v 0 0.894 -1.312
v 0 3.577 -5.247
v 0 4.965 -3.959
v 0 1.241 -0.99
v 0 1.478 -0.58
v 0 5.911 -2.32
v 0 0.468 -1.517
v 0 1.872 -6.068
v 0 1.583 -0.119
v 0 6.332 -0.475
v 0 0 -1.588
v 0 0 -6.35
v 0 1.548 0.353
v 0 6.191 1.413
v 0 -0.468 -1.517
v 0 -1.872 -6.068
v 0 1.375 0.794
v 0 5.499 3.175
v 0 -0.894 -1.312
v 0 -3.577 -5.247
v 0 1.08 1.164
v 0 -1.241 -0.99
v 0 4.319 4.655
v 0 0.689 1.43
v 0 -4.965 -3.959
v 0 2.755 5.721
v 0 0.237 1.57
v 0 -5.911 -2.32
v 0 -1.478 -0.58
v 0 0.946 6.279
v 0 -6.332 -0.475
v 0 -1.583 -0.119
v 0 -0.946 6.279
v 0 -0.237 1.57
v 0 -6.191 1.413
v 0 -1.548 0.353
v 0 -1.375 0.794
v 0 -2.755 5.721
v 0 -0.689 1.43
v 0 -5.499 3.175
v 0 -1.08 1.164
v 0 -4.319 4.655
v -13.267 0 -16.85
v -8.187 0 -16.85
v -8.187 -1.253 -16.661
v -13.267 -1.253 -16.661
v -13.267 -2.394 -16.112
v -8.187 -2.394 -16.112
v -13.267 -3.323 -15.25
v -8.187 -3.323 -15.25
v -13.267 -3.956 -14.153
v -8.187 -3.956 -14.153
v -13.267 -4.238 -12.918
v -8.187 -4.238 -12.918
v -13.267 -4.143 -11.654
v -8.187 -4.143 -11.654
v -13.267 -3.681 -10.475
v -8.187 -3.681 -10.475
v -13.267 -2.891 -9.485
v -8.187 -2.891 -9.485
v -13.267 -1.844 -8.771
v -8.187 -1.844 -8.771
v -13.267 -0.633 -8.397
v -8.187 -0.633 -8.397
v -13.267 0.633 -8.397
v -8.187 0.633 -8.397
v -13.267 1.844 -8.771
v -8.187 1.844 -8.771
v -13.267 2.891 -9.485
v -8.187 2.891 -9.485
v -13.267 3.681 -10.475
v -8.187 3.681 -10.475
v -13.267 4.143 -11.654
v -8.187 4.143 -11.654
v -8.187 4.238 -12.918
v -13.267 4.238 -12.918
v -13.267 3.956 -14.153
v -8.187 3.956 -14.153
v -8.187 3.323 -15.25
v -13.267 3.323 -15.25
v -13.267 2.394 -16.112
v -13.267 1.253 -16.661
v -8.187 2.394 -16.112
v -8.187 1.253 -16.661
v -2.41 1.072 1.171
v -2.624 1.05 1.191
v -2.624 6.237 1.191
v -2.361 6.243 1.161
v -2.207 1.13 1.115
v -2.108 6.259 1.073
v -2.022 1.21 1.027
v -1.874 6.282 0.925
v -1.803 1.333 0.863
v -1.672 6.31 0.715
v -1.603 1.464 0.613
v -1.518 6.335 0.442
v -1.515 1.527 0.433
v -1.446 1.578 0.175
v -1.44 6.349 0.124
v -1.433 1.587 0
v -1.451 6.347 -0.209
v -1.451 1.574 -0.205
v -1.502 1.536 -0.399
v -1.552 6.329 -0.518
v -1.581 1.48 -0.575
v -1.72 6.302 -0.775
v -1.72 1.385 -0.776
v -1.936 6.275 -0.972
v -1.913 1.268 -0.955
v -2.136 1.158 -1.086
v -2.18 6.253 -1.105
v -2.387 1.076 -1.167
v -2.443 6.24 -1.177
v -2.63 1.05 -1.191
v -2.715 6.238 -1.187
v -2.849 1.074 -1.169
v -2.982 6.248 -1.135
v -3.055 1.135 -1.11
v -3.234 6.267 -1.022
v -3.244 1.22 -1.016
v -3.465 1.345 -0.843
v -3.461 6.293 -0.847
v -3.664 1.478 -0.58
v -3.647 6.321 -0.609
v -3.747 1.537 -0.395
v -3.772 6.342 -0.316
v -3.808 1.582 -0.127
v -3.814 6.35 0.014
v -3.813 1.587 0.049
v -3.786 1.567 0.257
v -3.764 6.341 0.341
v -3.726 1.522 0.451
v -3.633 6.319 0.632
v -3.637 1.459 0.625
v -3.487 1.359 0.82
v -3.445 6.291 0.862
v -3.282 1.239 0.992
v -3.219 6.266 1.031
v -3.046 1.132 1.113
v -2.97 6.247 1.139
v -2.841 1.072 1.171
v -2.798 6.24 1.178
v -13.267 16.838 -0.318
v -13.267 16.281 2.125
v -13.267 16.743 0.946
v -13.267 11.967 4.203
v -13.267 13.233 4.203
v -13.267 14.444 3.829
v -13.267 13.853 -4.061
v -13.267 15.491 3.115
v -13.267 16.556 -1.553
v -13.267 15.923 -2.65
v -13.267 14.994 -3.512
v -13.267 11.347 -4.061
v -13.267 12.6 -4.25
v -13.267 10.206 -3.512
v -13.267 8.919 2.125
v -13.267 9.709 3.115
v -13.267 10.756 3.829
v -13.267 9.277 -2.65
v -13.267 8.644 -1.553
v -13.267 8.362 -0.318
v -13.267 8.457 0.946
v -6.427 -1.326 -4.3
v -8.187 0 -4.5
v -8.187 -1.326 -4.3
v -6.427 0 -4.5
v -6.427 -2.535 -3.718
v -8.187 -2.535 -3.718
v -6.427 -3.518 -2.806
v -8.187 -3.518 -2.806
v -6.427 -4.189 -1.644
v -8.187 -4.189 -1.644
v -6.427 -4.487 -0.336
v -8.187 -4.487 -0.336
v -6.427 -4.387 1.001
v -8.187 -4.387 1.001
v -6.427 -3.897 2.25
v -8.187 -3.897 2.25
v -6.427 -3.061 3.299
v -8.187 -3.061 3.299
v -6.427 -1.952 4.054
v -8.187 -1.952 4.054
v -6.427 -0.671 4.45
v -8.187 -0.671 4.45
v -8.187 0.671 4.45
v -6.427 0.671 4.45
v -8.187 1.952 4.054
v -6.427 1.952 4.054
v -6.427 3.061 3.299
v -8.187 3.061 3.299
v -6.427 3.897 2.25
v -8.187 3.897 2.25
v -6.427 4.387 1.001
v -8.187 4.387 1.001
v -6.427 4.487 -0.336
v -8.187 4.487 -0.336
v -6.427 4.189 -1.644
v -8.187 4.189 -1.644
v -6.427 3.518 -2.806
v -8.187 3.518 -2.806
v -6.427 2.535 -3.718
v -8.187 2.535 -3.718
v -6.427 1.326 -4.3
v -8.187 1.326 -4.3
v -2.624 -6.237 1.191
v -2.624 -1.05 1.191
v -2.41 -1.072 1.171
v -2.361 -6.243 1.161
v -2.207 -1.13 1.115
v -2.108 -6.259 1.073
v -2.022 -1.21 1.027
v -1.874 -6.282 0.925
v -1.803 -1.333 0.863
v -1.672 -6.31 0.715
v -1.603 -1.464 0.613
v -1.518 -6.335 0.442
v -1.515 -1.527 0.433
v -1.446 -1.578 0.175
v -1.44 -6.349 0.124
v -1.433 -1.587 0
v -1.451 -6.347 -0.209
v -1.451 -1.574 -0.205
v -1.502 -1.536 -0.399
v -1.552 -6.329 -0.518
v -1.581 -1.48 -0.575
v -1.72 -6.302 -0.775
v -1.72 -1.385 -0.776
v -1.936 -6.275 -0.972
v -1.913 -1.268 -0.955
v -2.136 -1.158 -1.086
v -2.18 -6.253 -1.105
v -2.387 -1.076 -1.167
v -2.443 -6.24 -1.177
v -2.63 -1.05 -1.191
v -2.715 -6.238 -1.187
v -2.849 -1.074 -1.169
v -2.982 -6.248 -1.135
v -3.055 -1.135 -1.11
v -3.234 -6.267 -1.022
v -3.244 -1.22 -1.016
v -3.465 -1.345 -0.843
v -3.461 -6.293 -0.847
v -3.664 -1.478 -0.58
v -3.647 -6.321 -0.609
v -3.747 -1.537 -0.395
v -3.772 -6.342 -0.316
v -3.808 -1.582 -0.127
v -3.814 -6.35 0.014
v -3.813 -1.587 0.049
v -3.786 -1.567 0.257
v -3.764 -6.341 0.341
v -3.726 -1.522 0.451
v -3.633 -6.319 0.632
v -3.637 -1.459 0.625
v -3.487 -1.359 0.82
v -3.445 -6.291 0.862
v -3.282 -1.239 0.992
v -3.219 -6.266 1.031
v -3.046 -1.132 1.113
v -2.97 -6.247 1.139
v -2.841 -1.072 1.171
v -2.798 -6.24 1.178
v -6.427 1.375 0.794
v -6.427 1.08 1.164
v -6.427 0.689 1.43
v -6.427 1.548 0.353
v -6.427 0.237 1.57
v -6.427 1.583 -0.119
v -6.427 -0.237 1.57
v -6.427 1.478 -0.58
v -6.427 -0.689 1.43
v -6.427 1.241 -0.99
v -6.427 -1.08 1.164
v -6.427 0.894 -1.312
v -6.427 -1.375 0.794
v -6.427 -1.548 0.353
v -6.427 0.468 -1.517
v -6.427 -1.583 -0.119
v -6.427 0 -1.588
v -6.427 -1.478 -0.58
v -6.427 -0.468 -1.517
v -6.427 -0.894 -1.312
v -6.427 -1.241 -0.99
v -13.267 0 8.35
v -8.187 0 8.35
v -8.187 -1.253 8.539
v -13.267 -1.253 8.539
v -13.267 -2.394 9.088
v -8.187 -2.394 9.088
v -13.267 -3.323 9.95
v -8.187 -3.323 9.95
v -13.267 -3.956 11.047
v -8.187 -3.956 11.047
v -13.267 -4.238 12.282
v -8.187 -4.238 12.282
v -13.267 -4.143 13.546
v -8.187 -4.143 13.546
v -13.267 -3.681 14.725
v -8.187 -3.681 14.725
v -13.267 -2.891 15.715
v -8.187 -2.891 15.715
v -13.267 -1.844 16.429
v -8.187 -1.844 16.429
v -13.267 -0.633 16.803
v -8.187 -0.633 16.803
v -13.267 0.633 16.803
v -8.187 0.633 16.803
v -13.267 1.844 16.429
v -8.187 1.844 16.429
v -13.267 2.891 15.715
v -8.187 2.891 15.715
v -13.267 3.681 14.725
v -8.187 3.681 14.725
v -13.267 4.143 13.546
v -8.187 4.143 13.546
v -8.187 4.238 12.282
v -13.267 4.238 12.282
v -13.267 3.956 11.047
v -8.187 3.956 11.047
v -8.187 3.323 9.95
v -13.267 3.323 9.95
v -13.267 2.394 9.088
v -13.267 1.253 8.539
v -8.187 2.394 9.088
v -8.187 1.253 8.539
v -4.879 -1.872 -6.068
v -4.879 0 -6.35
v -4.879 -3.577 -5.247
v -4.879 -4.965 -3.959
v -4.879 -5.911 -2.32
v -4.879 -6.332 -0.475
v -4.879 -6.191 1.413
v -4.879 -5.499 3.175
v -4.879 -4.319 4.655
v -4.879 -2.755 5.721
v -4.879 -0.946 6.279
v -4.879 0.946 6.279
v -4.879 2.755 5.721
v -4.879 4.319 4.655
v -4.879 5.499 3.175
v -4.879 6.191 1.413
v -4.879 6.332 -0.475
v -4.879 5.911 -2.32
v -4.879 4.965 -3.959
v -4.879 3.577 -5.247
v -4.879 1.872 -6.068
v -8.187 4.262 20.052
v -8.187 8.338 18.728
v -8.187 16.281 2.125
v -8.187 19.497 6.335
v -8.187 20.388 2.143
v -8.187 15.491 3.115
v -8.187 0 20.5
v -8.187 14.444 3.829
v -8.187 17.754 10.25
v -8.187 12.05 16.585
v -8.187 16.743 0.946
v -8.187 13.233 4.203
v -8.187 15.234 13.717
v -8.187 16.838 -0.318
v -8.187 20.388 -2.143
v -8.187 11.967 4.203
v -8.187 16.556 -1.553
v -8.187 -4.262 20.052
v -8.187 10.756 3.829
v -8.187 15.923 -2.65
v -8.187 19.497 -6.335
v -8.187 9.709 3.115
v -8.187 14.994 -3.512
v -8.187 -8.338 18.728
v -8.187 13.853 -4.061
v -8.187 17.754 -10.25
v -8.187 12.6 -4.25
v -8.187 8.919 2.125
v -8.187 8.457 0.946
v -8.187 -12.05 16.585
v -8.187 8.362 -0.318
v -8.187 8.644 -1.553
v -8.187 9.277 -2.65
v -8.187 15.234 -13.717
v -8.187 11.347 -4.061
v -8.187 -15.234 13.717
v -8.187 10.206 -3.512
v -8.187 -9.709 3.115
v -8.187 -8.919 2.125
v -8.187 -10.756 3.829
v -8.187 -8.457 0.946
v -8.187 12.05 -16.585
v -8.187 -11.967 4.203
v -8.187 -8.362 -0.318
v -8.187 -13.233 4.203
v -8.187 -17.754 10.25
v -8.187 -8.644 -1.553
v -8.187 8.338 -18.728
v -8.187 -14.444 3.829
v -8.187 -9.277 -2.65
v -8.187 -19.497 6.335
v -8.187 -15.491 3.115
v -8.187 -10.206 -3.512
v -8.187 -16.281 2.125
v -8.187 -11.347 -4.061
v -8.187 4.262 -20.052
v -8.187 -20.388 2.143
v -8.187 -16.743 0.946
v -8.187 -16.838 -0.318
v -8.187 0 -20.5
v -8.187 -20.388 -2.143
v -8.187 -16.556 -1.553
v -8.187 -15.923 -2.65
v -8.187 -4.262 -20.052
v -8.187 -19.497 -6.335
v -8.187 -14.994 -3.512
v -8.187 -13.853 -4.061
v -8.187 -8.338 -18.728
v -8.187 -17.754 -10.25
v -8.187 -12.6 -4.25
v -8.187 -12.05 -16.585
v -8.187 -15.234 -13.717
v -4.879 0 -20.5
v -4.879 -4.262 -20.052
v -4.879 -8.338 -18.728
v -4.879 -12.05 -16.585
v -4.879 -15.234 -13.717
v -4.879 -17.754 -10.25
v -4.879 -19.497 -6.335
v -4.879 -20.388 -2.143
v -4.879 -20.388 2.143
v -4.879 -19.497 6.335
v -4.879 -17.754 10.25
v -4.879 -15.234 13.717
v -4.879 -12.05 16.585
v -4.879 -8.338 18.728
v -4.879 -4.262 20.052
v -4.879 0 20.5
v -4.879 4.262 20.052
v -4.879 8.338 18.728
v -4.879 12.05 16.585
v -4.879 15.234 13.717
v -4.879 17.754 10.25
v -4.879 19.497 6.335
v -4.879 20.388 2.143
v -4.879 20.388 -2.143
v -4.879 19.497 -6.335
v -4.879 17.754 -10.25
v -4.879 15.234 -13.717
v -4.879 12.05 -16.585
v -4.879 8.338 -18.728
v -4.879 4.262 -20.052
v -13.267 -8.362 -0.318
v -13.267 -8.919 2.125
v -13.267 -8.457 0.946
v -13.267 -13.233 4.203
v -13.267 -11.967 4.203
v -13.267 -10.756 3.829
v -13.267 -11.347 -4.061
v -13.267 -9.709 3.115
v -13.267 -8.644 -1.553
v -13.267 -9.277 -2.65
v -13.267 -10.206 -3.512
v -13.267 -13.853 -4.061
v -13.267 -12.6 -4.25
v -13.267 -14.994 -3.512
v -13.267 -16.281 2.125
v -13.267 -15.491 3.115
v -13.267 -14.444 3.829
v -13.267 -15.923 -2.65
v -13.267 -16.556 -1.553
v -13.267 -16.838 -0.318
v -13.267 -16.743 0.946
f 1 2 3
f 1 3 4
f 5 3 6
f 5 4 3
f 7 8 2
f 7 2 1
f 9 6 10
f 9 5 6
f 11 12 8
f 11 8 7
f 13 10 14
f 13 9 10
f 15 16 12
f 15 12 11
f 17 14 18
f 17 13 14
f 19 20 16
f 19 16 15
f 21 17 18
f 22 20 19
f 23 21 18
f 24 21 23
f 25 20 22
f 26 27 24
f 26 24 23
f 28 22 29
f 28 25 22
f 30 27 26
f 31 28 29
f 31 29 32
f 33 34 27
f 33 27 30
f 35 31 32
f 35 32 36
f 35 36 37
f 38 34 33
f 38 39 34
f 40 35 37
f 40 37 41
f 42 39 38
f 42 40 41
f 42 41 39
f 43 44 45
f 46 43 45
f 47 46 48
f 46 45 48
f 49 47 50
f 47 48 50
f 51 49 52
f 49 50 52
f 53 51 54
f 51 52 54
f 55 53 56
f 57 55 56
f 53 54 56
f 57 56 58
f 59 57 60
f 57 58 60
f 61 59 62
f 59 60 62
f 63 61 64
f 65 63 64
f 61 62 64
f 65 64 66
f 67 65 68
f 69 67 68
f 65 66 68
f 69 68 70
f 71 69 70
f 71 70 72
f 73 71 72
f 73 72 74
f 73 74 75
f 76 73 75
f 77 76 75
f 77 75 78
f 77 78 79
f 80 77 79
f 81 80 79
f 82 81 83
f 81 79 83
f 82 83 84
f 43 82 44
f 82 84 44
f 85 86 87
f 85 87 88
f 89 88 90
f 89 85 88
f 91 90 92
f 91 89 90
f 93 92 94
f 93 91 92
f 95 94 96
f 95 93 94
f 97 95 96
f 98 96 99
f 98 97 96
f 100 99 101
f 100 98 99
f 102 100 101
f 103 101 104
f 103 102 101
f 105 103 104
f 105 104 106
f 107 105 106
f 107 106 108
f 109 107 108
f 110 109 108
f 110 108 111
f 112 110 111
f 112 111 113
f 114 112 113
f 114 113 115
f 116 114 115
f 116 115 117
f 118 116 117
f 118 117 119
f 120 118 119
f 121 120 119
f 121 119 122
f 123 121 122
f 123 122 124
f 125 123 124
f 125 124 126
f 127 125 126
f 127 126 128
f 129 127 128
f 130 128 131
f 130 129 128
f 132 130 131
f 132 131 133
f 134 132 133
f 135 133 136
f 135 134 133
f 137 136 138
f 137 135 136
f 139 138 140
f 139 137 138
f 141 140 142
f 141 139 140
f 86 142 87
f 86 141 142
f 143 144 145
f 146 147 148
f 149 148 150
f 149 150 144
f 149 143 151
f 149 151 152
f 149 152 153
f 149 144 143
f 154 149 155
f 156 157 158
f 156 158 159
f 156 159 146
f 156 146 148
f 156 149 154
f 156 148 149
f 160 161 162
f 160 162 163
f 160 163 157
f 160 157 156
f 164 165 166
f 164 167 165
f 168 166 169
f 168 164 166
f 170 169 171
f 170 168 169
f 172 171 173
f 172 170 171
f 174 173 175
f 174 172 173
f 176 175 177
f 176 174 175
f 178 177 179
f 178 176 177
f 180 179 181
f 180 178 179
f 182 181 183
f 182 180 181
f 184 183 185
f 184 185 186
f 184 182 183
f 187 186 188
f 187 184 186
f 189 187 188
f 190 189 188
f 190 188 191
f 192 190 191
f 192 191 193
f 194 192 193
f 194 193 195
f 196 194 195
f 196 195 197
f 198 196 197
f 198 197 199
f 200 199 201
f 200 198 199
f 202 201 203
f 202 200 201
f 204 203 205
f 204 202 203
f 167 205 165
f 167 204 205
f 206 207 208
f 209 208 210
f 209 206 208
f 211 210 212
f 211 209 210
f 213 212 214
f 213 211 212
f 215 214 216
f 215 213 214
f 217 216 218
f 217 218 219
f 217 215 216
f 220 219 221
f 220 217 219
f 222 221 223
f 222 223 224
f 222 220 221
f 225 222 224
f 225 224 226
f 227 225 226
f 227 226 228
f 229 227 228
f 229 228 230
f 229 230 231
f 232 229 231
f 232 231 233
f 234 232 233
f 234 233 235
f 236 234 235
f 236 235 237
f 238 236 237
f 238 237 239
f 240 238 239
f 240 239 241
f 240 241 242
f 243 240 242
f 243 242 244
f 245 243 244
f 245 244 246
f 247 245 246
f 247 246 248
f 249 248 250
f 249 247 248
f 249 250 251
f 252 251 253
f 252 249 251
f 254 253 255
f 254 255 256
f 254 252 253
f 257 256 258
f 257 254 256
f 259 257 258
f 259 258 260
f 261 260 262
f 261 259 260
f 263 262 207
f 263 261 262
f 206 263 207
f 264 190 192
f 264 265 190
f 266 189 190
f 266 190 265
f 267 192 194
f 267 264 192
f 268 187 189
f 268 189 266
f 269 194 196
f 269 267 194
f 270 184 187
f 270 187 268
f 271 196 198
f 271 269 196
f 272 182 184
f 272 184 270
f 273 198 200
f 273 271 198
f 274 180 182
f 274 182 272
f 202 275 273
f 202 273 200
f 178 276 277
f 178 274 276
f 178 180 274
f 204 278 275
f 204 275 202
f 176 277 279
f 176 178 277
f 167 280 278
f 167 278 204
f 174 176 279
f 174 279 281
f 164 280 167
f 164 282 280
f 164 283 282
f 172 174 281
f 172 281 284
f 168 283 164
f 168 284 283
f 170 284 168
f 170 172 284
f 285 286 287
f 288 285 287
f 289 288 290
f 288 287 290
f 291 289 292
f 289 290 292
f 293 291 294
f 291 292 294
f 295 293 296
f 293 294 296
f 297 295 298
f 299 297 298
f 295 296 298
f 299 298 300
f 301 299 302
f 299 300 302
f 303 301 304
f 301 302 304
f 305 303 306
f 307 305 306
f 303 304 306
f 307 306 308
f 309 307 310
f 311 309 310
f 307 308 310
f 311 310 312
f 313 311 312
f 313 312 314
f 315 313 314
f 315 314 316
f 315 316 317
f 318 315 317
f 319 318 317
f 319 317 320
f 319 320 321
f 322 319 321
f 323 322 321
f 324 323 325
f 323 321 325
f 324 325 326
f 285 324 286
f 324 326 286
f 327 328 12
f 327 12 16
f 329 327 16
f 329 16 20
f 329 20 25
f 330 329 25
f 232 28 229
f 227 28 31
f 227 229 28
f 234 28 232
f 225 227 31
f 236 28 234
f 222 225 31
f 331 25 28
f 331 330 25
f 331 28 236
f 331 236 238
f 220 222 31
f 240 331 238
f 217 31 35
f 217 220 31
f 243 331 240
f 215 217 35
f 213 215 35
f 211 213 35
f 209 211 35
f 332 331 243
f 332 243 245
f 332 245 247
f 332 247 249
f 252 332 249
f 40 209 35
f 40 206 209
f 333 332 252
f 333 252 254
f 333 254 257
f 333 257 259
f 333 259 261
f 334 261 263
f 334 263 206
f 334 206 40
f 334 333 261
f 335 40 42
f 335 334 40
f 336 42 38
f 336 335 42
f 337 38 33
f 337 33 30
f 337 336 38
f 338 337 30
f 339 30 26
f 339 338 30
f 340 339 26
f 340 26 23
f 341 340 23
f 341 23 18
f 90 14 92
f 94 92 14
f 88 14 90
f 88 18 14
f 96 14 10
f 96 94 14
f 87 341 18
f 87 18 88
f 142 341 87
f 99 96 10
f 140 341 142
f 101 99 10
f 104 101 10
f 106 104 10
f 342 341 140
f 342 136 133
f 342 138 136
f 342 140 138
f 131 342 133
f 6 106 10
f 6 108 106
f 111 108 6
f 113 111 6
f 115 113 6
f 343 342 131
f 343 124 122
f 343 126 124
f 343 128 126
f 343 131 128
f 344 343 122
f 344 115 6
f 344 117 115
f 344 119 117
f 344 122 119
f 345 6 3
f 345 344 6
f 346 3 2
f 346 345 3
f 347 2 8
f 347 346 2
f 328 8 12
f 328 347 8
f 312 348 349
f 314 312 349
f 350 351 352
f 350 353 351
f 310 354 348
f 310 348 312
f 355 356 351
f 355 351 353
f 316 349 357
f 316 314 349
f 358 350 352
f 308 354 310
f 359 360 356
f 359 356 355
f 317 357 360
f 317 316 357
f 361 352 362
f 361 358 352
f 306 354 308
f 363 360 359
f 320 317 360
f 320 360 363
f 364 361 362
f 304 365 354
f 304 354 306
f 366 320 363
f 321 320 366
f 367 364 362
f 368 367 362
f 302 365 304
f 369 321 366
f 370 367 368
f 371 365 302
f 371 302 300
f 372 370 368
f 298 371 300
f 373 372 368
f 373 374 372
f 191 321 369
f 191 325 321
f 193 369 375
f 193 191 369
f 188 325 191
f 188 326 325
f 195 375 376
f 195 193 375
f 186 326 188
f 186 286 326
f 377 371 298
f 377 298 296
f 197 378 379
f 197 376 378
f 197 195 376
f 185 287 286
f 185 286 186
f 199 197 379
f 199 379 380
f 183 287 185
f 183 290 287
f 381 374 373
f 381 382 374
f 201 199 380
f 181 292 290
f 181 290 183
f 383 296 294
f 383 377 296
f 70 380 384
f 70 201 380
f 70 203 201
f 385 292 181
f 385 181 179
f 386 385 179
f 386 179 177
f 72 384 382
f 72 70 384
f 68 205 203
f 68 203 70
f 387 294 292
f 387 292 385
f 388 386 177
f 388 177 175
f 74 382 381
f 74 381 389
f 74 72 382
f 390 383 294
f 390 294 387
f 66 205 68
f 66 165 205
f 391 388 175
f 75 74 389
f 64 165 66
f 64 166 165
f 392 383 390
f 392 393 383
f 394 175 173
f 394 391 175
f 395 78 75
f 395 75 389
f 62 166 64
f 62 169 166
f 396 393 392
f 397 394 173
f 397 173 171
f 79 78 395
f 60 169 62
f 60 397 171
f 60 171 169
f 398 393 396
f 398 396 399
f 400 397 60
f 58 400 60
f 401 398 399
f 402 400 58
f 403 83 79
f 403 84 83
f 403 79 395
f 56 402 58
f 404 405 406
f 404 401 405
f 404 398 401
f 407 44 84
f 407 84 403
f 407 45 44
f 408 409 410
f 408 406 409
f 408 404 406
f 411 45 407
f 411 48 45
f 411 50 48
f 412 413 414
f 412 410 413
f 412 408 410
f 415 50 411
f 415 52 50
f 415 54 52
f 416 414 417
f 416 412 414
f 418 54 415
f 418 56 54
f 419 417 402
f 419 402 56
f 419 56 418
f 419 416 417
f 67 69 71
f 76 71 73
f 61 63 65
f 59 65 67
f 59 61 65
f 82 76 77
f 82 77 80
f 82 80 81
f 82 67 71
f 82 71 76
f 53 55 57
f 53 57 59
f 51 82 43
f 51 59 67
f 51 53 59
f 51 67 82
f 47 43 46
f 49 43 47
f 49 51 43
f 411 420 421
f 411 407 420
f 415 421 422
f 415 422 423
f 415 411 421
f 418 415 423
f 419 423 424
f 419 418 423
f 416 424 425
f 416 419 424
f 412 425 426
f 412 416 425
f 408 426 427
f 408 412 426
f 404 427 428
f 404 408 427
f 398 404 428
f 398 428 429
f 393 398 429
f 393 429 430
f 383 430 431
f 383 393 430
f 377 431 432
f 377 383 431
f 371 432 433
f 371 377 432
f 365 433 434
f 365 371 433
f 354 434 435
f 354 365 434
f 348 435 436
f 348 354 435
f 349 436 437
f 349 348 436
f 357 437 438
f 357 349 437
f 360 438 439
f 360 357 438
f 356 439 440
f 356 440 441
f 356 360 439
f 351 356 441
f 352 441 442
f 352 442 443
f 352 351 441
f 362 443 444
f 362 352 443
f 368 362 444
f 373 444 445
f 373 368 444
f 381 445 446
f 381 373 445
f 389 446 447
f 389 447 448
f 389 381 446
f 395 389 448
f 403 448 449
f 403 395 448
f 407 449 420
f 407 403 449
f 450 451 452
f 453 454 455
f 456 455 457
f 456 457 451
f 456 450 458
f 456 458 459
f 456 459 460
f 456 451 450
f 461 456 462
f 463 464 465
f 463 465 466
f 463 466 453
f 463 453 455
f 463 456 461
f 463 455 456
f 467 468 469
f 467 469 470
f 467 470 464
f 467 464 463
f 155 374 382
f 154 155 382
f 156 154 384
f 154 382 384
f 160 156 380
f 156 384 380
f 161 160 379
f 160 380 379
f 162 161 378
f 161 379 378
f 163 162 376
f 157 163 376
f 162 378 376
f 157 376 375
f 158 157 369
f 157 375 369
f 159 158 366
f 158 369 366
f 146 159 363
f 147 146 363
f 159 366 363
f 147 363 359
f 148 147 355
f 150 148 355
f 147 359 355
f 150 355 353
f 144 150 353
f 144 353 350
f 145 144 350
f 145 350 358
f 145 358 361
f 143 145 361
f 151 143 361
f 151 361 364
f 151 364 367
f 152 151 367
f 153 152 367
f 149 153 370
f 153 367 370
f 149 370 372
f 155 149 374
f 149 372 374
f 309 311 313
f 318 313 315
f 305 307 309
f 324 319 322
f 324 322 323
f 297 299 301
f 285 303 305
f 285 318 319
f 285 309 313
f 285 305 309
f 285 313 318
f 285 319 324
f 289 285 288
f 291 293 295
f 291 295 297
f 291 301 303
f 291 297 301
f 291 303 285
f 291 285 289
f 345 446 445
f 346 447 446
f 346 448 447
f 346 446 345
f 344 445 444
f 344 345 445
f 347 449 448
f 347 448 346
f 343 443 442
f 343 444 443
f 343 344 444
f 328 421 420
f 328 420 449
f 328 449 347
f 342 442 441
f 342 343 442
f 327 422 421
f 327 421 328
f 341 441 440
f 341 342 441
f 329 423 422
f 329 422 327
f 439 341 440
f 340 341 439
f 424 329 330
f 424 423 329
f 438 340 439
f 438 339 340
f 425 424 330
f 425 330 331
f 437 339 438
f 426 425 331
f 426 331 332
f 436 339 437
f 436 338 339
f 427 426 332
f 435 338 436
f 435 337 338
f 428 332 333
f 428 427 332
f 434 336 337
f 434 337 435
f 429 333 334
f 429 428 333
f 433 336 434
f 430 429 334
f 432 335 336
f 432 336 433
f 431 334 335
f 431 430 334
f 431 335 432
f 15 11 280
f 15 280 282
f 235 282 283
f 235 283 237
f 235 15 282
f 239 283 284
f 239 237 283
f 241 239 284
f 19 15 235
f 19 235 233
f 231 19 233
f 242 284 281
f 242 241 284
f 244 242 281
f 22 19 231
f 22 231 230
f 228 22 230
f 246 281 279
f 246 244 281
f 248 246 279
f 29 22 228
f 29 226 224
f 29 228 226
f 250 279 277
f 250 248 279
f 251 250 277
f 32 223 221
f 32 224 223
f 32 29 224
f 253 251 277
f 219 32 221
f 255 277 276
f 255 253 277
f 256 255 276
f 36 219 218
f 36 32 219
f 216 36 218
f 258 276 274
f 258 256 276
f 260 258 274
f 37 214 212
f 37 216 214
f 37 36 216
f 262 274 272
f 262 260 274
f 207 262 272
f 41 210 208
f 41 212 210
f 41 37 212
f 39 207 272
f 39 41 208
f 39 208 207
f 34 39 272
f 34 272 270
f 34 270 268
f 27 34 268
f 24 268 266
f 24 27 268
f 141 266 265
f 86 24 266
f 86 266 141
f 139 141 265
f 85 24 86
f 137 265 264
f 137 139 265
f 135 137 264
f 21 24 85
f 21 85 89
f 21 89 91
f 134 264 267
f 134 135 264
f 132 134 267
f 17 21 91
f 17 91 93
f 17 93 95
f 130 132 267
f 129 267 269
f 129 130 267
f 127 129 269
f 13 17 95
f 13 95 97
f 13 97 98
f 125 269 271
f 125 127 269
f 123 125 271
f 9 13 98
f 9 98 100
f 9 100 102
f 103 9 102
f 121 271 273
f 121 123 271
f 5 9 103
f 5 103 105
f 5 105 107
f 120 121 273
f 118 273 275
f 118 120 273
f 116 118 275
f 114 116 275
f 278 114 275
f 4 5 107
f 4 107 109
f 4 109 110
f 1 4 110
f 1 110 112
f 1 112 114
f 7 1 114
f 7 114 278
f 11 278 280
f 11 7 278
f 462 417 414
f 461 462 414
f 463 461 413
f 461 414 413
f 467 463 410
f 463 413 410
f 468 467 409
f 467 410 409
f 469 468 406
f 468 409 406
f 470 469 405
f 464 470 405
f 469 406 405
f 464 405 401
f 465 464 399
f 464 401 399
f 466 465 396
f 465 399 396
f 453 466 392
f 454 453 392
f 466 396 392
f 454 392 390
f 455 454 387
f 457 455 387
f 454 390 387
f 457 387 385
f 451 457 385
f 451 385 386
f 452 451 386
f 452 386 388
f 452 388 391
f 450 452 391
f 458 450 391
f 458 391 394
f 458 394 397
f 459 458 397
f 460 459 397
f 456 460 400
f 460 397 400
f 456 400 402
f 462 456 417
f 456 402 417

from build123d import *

# Parameters (mm, degrees)
SKETCH2_R               = 4.25
BOSS_EXTRUDE1_DEPTH     = 5.08
CUT_EXTRUDE1_DEPTH      = 32.882966676
CUT_EXTRUDE1_DEPTH_BACK = 32.882966676
SKETCH3_R               = 1.190625


with BuildPart() as part:
    # Sketch1 → Revolve1 (revolve)
    with BuildSketch(Plane.XY):
        Polygon((0, 1.5875), (0, 6.35), (-4.87911158, 6.35), (-4.87911158, 20.5), (-8.187387237, 20.5), (-8.187387237, 4.5), (-6.426815736, 4.5), (-6.426815736, 1.5875), align=None)
    revolve(axis=Axis((0, 0, 0), (-1, 0, 0)))

    # Sketch2 → Boss-Extrude1 (add)
    with BuildSketch(Plane.ZY.offset(8.187387237)):
        with Locations((0, 12.6)):
            Circle(SKETCH2_R)
        with Locations((12.6, 0)):
            Circle(SKETCH2_R)
        with Locations((0, -12.6)):
            Circle(SKETCH2_R)
        with Locations((-12.6, 0)):
            Circle(SKETCH2_R)
    extrude(amount=BOSS_EXTRUDE1_DEPTH)

    # Sketch3 → Cut-Extrude1 (cut, two sides: drawn at the far end of the back side and taken through both)
    with BuildSketch(Plane(origin=(0, 0, 0), x_dir=(1, 0, 0), z_dir=(0, 1, 0)).offset(-CUT_EXTRUDE1_DEPTH_BACK)):
        with Locations((-2.623694819, 0)):
            Circle(SKETCH3_R)
    extrude(amount=CUT_EXTRUDE1_DEPTH + CUT_EXTRUDE1_DEPTH_BACK, mode=Mode.SUBTRACT)


solid = part.part
